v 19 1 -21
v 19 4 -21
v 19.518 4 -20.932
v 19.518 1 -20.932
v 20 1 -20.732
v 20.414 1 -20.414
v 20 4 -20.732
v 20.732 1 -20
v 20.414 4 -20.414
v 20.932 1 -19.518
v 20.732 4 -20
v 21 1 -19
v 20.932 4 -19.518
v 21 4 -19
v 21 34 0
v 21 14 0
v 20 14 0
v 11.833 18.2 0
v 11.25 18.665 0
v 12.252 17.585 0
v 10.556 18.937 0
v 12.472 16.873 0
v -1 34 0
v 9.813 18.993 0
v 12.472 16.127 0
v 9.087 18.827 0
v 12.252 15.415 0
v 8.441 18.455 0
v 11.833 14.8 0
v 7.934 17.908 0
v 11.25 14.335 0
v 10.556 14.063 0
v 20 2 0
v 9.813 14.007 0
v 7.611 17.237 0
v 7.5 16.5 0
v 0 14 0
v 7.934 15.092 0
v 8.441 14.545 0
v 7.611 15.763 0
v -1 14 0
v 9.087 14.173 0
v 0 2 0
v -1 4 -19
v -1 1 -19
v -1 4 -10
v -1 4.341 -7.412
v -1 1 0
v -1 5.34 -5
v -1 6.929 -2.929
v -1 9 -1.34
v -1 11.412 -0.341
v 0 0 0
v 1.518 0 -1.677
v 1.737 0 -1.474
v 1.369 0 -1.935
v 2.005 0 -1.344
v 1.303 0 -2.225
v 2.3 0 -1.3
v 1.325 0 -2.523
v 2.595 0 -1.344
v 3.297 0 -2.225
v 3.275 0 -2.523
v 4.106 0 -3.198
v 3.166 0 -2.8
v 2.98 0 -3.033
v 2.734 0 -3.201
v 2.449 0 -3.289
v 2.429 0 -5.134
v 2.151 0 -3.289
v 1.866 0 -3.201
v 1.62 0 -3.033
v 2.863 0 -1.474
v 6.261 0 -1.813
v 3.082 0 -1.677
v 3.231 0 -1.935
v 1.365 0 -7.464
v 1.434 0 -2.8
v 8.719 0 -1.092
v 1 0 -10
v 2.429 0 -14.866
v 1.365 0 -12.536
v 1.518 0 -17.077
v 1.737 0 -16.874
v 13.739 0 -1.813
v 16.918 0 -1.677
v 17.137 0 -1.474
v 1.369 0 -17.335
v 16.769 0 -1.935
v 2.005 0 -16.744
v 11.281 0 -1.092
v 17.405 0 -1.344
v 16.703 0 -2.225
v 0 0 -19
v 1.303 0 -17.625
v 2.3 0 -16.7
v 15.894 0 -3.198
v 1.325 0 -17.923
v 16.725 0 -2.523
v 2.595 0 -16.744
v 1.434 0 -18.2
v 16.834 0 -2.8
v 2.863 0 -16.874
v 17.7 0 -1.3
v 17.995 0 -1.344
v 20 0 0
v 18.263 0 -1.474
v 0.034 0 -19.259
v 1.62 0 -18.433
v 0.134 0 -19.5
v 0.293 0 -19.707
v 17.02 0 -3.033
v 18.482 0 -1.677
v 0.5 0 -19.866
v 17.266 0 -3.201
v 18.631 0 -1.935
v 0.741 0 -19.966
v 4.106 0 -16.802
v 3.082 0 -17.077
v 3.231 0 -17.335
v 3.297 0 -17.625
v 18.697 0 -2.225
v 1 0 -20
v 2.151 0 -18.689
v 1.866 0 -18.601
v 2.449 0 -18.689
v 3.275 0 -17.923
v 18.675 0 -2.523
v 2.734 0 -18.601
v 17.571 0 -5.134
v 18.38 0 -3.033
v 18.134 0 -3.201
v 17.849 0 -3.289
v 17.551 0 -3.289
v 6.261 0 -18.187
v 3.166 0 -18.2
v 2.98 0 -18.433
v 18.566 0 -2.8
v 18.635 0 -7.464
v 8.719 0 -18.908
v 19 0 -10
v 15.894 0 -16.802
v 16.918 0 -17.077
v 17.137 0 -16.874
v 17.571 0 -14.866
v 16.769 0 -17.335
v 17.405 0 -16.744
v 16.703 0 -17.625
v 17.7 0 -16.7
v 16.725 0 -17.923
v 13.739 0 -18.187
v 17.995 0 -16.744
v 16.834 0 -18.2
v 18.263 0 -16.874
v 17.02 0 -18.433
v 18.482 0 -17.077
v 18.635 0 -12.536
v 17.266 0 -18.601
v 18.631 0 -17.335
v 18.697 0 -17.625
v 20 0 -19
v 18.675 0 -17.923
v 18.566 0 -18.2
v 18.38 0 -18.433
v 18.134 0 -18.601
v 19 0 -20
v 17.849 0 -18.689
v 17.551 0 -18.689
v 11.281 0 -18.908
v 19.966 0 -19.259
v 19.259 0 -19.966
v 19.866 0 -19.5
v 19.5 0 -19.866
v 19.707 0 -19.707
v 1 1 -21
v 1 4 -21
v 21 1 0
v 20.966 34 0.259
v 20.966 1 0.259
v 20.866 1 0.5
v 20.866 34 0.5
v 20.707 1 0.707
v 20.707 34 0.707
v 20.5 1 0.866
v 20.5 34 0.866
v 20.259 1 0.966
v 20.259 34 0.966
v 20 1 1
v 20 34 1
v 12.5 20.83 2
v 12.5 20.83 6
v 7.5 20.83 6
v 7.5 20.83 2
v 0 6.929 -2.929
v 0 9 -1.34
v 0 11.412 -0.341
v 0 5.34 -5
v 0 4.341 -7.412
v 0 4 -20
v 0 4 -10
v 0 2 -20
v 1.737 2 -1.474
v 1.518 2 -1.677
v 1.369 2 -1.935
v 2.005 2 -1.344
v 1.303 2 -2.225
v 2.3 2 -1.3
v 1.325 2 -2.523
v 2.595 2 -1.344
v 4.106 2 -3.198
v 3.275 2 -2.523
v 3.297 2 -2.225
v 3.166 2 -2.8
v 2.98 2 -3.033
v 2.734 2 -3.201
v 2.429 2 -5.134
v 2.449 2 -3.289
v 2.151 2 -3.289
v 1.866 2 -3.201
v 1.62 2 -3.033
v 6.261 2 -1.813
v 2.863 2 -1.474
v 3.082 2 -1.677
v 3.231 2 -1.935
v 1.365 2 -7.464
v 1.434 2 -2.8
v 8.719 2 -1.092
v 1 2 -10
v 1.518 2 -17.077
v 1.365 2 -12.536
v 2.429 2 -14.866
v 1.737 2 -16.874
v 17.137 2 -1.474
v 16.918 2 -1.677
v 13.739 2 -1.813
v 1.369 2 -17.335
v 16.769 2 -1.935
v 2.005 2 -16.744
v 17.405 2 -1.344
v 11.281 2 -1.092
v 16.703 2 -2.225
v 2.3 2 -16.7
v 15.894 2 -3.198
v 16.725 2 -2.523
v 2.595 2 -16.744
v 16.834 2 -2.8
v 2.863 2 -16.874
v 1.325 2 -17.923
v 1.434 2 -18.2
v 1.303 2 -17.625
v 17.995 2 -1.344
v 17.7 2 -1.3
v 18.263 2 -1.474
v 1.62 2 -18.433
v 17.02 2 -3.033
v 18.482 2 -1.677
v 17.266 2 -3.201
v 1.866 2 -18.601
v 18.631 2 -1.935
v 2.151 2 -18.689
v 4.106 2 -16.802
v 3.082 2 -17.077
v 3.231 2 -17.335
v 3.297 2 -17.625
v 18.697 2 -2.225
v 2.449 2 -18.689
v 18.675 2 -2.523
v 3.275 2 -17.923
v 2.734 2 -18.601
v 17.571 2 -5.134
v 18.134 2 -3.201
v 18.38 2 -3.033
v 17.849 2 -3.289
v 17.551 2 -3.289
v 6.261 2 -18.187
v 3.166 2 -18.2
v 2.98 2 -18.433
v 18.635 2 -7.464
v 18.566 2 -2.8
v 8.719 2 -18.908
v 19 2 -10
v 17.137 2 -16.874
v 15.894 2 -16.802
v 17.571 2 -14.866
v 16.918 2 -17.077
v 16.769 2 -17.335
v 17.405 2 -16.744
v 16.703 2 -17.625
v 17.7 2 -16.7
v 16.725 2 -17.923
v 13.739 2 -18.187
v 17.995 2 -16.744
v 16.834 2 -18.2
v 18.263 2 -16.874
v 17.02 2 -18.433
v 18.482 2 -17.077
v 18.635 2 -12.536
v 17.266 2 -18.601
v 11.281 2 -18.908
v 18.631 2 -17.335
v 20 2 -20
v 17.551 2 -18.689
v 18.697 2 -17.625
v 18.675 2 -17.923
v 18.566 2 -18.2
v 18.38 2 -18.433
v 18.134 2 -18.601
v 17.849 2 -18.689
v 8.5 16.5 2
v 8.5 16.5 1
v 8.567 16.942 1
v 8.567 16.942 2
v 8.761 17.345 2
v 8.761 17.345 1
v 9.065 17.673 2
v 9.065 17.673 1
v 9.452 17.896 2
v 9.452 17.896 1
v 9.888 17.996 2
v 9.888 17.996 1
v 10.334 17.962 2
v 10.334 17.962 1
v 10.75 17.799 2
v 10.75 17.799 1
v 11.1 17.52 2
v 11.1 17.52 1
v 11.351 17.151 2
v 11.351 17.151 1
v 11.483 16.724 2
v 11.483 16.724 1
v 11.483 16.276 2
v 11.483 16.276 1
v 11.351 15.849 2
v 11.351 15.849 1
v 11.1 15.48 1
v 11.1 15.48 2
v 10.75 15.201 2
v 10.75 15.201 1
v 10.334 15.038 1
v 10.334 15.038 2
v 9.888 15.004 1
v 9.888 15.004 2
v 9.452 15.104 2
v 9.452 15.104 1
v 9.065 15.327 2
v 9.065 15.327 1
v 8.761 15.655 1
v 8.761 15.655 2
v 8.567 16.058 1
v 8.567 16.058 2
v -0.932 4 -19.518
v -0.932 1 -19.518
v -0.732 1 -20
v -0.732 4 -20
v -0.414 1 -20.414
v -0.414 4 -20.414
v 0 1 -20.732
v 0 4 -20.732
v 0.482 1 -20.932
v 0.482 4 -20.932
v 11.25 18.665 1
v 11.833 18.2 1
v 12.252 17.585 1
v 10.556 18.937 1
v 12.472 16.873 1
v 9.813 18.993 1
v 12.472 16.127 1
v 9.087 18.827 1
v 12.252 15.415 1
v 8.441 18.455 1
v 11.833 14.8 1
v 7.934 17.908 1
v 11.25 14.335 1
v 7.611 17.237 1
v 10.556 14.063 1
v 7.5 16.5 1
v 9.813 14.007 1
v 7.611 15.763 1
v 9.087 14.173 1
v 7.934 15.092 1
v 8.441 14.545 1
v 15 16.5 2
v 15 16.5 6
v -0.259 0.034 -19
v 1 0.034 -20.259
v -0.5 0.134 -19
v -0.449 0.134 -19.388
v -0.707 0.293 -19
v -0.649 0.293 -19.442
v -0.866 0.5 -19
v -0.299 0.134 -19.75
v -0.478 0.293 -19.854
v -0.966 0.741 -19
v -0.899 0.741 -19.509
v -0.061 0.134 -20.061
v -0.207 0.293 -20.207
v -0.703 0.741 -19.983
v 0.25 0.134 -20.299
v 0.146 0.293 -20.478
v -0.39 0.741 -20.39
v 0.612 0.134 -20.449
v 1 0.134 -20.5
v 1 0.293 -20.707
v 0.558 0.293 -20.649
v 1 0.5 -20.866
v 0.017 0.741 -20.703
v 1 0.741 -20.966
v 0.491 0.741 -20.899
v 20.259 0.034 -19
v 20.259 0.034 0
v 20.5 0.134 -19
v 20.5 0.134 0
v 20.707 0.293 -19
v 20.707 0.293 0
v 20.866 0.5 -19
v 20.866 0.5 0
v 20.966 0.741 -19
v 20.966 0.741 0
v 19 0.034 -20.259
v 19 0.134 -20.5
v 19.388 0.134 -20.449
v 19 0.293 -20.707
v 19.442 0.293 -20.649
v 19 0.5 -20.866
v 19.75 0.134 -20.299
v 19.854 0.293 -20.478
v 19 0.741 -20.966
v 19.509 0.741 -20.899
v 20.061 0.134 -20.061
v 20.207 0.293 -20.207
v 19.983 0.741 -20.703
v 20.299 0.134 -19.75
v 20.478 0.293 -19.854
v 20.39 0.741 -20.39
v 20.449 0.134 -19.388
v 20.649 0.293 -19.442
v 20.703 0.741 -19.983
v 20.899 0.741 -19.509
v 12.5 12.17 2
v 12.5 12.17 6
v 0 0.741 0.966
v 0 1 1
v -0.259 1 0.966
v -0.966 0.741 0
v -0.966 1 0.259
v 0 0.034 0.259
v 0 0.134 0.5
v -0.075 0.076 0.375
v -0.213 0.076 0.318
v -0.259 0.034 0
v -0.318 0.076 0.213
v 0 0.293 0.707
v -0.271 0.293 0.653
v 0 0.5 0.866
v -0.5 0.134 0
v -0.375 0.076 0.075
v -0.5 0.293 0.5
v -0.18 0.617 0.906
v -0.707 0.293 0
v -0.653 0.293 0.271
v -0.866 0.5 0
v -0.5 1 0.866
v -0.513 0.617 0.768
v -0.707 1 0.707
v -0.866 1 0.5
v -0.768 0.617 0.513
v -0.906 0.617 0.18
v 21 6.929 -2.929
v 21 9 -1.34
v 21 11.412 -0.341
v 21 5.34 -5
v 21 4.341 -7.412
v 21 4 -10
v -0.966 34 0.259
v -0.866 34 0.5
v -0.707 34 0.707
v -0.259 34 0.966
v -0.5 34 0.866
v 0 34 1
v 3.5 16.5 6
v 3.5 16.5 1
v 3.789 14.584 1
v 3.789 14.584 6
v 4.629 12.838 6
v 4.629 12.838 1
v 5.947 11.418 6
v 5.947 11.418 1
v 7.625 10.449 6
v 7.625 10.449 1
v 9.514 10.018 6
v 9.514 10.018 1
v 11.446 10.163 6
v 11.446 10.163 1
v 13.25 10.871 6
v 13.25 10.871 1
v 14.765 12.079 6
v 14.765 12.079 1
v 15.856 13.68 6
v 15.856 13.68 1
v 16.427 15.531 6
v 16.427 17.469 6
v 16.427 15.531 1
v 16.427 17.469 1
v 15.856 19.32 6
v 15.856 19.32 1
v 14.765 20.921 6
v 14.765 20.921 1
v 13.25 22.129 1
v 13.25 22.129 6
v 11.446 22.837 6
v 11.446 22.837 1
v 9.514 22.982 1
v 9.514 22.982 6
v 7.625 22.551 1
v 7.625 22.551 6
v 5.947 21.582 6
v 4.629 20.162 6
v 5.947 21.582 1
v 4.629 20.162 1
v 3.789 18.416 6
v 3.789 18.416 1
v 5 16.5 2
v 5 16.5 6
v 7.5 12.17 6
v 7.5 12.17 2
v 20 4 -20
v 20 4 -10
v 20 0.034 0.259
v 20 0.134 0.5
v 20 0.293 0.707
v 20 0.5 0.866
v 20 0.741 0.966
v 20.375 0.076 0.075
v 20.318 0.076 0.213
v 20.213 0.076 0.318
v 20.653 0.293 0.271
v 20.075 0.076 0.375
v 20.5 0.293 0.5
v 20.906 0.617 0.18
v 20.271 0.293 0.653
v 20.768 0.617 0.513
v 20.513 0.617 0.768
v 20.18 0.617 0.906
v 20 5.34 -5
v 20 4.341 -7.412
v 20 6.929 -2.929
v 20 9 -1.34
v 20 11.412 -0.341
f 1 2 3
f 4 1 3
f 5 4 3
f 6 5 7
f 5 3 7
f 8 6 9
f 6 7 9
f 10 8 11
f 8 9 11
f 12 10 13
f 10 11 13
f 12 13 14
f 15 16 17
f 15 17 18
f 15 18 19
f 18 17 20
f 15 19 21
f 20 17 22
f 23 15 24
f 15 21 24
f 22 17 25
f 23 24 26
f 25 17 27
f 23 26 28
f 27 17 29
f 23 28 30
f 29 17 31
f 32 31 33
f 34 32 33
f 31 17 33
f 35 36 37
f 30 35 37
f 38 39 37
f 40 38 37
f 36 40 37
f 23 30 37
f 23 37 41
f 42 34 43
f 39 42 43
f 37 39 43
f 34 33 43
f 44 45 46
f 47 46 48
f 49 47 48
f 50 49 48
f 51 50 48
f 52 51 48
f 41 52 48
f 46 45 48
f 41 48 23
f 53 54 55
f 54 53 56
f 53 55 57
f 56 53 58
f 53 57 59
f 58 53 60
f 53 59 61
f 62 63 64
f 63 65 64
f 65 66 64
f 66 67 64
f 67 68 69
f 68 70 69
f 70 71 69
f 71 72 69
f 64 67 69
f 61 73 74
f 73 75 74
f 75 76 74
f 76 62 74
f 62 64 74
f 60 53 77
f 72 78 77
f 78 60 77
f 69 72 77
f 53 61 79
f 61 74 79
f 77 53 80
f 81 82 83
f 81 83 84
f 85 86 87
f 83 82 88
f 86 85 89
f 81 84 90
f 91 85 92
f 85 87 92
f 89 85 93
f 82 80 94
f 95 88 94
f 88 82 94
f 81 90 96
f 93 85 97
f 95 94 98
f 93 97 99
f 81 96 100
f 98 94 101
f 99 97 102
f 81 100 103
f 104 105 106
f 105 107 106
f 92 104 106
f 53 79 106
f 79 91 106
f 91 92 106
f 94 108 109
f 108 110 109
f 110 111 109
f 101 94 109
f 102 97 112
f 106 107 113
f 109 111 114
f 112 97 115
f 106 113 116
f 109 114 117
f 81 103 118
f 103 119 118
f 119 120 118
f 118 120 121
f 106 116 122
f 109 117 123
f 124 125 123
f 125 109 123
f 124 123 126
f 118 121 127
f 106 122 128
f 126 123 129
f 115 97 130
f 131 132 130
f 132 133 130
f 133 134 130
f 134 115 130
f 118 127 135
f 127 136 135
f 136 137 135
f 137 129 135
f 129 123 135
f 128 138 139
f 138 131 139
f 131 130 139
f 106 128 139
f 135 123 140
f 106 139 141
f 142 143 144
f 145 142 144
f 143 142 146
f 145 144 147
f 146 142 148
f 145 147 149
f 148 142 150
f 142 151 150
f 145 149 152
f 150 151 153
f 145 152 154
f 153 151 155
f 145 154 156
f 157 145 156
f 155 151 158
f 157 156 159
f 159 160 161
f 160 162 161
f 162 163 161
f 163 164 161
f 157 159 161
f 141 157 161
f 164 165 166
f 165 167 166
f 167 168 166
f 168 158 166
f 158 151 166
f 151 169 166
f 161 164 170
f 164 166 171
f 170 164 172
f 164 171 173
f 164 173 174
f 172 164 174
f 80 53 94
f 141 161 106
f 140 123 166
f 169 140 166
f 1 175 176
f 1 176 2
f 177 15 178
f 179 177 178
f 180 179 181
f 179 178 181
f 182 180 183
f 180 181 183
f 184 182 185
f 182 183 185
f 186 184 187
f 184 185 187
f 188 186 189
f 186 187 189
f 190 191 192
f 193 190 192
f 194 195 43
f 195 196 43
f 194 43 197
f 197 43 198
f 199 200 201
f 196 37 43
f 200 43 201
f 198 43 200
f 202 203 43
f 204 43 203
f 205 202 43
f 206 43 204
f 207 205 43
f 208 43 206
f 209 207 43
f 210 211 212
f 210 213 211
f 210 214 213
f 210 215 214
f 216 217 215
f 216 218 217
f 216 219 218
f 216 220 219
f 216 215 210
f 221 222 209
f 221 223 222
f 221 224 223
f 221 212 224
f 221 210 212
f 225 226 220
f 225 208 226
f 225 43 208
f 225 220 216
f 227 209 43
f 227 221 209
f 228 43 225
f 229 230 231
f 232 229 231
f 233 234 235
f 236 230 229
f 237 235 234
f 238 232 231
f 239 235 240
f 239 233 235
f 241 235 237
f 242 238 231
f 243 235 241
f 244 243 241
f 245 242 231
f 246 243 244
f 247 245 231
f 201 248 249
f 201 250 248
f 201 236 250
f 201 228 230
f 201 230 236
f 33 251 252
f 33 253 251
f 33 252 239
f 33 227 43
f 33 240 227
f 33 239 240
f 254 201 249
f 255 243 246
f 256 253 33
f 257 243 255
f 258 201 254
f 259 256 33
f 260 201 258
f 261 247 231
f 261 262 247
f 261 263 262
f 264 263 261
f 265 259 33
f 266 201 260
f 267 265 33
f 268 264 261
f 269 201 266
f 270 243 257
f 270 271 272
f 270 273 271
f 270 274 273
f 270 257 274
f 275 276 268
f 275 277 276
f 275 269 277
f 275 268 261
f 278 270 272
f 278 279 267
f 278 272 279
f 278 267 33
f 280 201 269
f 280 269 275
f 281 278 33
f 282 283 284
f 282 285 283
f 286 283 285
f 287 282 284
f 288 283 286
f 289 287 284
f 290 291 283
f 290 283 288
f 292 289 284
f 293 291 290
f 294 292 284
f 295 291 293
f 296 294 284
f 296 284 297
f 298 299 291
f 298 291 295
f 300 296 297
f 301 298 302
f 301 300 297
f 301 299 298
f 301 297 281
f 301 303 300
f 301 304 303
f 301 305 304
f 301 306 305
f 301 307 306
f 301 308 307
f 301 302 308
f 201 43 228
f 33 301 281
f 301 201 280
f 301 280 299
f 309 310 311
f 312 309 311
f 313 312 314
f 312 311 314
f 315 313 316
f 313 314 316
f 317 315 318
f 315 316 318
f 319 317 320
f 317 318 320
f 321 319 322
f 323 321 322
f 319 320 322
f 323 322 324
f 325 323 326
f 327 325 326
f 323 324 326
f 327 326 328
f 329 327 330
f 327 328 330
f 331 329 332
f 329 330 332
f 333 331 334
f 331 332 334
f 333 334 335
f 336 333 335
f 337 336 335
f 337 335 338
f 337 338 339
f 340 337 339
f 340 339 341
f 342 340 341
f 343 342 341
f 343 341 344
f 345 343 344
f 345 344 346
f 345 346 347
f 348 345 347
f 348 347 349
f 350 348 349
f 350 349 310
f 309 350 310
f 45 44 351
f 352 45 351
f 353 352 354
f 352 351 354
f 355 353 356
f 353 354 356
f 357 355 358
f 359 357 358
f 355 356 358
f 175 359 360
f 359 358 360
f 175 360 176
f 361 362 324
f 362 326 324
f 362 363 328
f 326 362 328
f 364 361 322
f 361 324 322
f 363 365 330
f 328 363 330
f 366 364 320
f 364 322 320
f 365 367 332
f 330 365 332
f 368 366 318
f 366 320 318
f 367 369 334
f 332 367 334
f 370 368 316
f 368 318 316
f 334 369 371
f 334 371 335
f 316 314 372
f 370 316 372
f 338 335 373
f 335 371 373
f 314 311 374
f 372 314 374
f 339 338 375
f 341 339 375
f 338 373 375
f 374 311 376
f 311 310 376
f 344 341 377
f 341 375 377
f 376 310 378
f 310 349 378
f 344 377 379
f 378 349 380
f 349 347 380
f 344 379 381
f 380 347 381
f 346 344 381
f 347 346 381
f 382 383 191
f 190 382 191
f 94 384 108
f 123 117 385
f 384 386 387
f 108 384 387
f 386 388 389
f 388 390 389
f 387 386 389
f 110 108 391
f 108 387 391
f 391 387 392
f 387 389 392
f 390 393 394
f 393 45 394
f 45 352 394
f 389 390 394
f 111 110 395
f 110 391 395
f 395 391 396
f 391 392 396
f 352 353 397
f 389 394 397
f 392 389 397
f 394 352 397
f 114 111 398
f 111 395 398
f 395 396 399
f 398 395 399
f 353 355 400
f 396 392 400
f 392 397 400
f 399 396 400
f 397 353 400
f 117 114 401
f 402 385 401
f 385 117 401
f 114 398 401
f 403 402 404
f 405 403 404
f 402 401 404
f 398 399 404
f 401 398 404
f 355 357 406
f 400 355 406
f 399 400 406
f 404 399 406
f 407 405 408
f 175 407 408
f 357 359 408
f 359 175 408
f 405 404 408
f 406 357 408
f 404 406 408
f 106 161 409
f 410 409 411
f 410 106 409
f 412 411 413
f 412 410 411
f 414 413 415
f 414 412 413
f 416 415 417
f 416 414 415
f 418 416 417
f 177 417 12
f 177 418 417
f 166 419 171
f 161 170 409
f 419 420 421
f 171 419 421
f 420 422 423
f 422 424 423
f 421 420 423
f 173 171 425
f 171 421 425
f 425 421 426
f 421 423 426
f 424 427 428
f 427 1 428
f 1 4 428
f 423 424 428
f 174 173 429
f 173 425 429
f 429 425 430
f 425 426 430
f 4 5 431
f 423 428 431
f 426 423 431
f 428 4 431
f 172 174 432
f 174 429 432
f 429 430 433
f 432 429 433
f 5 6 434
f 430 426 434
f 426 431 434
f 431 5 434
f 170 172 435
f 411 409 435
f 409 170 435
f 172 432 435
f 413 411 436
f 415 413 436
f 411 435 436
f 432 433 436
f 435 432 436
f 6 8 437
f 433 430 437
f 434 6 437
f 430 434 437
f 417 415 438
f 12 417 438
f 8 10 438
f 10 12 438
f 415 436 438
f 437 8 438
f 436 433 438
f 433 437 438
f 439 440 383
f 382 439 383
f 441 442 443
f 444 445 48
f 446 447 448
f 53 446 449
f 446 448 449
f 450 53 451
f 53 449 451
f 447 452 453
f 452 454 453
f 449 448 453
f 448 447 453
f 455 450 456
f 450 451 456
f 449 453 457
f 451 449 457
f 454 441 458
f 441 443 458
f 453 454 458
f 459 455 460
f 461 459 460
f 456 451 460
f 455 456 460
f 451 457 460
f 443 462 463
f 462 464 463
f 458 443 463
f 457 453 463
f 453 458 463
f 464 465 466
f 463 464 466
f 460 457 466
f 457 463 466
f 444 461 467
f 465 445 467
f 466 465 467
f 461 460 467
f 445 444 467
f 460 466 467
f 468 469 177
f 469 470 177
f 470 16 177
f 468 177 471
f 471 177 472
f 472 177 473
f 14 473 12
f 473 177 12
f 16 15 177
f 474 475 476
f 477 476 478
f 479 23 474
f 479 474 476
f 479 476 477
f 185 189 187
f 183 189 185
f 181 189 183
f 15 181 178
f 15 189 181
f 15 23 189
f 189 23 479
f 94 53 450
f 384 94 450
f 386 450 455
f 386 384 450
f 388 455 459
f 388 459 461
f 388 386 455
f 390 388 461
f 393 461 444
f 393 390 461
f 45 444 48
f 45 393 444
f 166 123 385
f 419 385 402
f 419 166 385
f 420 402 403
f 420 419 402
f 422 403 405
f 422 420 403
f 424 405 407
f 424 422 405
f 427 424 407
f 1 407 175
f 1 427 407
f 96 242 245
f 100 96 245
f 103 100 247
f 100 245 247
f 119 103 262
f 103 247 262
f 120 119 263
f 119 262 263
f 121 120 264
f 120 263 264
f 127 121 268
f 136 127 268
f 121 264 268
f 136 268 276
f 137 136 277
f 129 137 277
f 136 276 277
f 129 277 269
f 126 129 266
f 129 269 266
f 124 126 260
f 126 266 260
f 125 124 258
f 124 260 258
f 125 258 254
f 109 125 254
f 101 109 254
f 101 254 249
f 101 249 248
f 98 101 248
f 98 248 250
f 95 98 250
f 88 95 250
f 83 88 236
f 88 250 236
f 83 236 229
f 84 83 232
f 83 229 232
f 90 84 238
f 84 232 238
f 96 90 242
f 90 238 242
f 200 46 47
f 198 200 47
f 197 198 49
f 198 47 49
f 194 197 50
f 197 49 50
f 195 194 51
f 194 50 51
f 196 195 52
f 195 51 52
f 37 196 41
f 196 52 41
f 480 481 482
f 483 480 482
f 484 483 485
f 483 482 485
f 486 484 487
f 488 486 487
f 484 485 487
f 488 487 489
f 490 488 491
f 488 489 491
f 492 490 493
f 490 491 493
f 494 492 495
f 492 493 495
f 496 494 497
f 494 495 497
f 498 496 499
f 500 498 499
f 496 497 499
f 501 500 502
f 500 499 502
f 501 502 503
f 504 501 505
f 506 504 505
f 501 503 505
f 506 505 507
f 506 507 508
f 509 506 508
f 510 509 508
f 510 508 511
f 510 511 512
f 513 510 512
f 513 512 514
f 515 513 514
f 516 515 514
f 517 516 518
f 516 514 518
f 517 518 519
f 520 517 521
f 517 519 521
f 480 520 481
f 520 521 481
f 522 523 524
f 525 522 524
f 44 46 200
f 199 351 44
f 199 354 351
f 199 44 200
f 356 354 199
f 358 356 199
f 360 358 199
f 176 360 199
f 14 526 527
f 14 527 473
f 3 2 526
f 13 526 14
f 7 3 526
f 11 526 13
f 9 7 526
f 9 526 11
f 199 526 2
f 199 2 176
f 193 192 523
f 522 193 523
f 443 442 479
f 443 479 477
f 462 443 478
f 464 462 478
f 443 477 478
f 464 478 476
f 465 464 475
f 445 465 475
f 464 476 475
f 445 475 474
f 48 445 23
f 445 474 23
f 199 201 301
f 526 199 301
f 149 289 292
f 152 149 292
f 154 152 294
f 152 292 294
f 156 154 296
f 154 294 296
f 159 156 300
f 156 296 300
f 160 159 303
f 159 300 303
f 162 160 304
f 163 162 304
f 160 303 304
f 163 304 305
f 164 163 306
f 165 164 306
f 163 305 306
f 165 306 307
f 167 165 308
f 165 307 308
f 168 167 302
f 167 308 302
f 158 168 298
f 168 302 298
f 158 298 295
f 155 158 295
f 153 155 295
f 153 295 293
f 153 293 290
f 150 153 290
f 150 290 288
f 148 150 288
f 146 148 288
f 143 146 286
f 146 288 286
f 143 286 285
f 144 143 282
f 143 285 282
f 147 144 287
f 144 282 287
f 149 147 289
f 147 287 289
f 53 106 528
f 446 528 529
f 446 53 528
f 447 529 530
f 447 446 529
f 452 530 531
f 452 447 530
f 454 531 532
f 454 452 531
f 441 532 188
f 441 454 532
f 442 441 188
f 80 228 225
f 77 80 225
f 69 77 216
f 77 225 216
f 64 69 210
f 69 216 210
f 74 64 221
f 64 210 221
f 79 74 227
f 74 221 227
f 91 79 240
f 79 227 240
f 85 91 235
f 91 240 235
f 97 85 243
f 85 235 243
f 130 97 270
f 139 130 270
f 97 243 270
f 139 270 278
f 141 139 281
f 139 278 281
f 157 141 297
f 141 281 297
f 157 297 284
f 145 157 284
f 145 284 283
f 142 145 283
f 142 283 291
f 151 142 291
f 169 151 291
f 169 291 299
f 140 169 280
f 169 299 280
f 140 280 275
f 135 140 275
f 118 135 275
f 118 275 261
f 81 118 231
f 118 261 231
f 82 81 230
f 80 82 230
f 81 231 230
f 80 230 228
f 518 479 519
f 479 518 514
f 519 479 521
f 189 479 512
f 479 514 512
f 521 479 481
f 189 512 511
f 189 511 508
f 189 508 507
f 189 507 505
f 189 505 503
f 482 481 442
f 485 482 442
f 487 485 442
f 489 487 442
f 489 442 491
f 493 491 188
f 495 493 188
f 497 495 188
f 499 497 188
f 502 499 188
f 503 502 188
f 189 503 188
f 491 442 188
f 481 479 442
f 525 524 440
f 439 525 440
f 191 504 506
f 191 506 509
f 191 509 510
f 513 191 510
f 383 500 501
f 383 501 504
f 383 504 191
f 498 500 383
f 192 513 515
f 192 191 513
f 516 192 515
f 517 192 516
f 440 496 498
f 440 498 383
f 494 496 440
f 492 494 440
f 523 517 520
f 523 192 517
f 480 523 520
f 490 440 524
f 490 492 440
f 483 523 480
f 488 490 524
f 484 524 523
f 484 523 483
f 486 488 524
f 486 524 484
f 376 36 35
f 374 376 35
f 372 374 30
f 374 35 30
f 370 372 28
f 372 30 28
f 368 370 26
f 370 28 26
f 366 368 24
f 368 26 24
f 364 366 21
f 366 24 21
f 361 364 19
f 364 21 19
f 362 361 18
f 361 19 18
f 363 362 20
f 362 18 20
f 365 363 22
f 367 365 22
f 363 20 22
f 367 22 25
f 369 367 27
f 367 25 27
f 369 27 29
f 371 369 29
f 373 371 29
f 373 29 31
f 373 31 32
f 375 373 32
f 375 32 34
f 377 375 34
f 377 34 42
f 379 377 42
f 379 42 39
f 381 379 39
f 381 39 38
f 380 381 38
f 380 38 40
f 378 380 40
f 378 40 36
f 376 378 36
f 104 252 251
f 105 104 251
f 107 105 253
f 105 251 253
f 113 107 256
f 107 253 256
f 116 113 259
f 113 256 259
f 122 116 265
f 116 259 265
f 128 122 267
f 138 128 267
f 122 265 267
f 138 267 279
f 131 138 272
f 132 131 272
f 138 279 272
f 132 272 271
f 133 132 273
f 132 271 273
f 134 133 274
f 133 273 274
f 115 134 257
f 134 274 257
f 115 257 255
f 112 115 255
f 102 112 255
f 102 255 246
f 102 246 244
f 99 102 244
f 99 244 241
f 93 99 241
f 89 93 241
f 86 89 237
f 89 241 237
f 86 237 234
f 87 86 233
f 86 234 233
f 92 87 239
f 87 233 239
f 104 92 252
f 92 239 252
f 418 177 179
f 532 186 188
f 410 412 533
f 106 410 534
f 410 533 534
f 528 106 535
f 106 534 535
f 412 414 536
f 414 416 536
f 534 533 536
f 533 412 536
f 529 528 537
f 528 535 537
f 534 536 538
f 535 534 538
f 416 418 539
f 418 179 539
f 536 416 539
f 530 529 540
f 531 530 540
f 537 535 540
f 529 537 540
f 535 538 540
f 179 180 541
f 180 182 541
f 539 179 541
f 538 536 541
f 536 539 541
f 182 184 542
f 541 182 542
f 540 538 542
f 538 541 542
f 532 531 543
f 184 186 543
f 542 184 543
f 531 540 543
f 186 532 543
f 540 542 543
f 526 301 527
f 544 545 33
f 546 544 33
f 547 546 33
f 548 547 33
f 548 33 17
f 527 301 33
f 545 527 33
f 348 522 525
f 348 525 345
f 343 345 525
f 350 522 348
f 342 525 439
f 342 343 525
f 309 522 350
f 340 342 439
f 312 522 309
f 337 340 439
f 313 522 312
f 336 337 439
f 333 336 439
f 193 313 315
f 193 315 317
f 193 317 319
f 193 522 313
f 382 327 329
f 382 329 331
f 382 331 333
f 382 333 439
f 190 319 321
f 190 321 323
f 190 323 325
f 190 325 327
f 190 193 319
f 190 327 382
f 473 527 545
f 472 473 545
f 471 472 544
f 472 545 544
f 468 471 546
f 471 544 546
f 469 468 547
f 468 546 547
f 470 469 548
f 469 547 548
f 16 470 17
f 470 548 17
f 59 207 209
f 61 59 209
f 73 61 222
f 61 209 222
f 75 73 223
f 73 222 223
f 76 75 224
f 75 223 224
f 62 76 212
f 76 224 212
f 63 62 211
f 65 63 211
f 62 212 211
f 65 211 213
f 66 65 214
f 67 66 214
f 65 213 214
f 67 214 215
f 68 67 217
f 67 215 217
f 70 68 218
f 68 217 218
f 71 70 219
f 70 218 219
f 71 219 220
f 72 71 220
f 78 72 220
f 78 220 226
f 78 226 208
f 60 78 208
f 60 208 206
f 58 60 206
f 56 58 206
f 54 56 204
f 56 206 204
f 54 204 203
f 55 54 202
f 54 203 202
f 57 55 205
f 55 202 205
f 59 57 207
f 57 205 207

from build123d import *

# Parameters (mm, degrees)
SKETCH_1_W          = 22
SKETCH_1_H          = 22
SKETCH_1_W_2        = 20
SKETCH_1_H_2        = 20
EXTRUDE_1_DEPTH     = 4
SKETCH_2_W          = 20
SKETCH_2_H          = 20
EXTRUDE_2_DEPTH     = 2
CUT_EXTRUDE_1_DEPTH = 2
SKETCH_4_R          = 1
CUT_EXTRUDE_2_DEPTH = 2
EXTRUDE_4_DEPTH     = 30
CUT_EXTRUDE_3_DEPTH = 46.617978912
SKETCH_8_R          = 2.5
CUT_EXTRUDE_4_DEPTH = 4
SKETCH_10_R         = 6.5
EXTRUDE_5_DEPTH     = 5
CUT_EXTRUDE_5_DEPTH = 4
SKETCH_12_R         = 1.5
CUT_EXTRUDE_6_DEPTH = 4
FILLET_2_R          = 2
FILLET_3_R          = 2
FILLET_4_R          = 1
FILLET_5_R          = 1
FILLET_6_R          = 1


with BuildPart() as part:
    # 草图1 → 凸台-拉伸1 (new body)
    with BuildSketch(Plane(origin=(0, 0, 0), x_dir=(1, 0, 0), z_dir=(0, 1, 0))):
        with Locations((10, 10)):
            Rectangle(SKETCH_1_W, SKETCH_1_H)
        with Locations((10, 10)):
            Rectangle(SKETCH_1_W_2, SKETCH_1_H_2, mode=Mode.SUBTRACT)
    extrude(amount=EXTRUDE_1_DEPTH)

    # 草图2 → 凸台-拉伸2 (add)
    with BuildSketch(Plane(origin=(0, 0, 0), x_dir=(1, 0, 0), z_dir=(0, 1, 0))):
        with Locations((10, 10)):
            Rectangle(SKETCH_2_W, SKETCH_2_H)
    extrude(amount=EXTRUDE_2_DEPTH)

    # 草图3 → 切除-拉伸1 (cut)
    with BuildSketch(Plane(origin=(0, 2, 0), x_dir=(1, 0, 0), z_dir=(0, 1, 0))):
        with BuildLine():
            ThreePointArc((19, 10), (10, 19), (1, 10))
            Line((1, 10), (19, 10))
        make_face()
        with BuildLine():
            Line((19, 10), (1, 10))
            ThreePointArc((1, 10), (10, 1), (19, 10))
        make_face()
    extrude(amount=-CUT_EXTRUDE_1_DEPTH, mode=Mode.SUBTRACT)

    # 草图4 → 切除-拉伸2 (cut)
    with BuildSketch(Plane(origin=(0, 2, 0), x_dir=(1, 0, 0), z_dir=(0, 1, 0))):
        with Locations(Location((2.3, 17.7, 0), (0, 0, 270))):
            Circle(SKETCH_4_R)
        with Locations(Location((17.7, 17.7, 0), (0, 0, 270))):
            Circle(SKETCH_4_R)
        with Locations(Location((17.7, 2.3, 0), (0, 0, 270))):
            Circle(SKETCH_4_R)
        with Locations(Location((2.3, 2.3, 0), (0, 0, 270))):
            Circle(SKETCH_4_R)
    extrude(amount=-CUT_EXTRUDE_2_DEPTH, mode=Mode.SUBTRACT)

    # 草图5 → 凸台-拉伸4 (add)
    with BuildSketch(Plane(origin=(0, 4, 0), x_dir=(1, 0, 0), z_dir=(0, 1, 0))):
        Polygon((0, 0), (0, 10), (-1, 10), (-1, -1), (21, -1), (21, 10), (20, 10), (20, 0), align=None)
    extrude(amount=EXTRUDE_4_DEPTH)

    # 草图7 → 切除-拉伸3 (cut, through all)
    with BuildSketch(Plane.ZY.offset(1)):
        with BuildLine():
            ThreePointArc((-10, 4), (-2.928932188, 6.928932188), (0, 14))
            Line((0, 14), (-10, 14))
            Line((-10, 14), (-10, 4))
        make_face()
        with BuildLine():
            Line((-10, 14), (0, 14))
            ThreePointArc((0, 14), (-2.928932188, 21.071067812), (-10, 24))
            Line((-10, 24), (-10, 14))
        make_face()
        with BuildLine():
            Line((0, 14), (0, 34))
            Line((0, 34), (-10, 34))
            Line((-10, 34), (-10, 24))
            ThreePointArc((-10, 24), (-2.928932188, 21.071067812), (0, 14))
        make_face()
    extrude(amount=-CUT_EXTRUDE_3_DEPTH, mode=Mode.SUBTRACT)

    # 草图8 → 切除-拉伸4 (cut)
    with BuildSketch(Plane(origin=(0, 0, 0), x_dir=(-1, 0, 0), z_dir=(0, 0, -1))):
        with Locations((-10, 16.5)):
            Circle(SKETCH_8_R)
    extrude(amount=-CUT_EXTRUDE_4_DEPTH, mode=Mode.SUBTRACT)

    # 草图10 → 凸台-拉伸5 (add)
    with BuildSketch(Plane.XY.offset(1)):
        with Locations(Location((10, 16.5, 0), (0, 0, 180))):
            Circle(SKETCH_10_R)
    extrude(amount=EXTRUDE_5_DEPTH)

    # 草图11 → 切除-拉伸5 (cut)
    with BuildSketch(Plane.XY.offset(6)):
        Polygon((15, 16.5), (12.5, 20.830127019), (7.5, 20.830127019), (5, 16.5), (7.5, 12.169872981), (12.5, 12.169872981), align=None)
    extrude(amount=-CUT_EXTRUDE_5_DEPTH, mode=Mode.SUBTRACT)

    # 草图12 → 切除-拉伸6 (cut)
    with BuildSketch(Plane(origin=(0, 0, 1), x_dir=(-1, 0, 0), z_dir=(0, 0, -1))):
        with Locations((-10, 16.5)):
            Circle(SKETCH_12_R)
    extrude(amount=-CUT_EXTRUDE_6_DEPTH, mode=Mode.SUBTRACT)

    # 圆角2
    fillet_2_edges = [part.edges().sort_by_distance(p)[0] for p in [
        (-1, 2, -21),
    ]]
    fillet(fillet_2_edges, radius=FILLET_2_R)

    # 圆角3
    fillet_3_edges = [part.edges().sort_by_distance(p)[0] for p in [
        (21, 2, -21),
    ]]
    fillet(fillet_3_edges, radius=FILLET_3_R)

    # 圆角4
    fillet_4_edges = [part.edges().sort_by_distance(p)[0] for p in [
        (21, 17, 1),
    ]]
    fillet(fillet_4_edges, radius=FILLET_4_R - 0.0001)  # a hair under: the kernel refuses the full size

    # 圆角5
    fillet_5_edges = [part.edges().sort_by_distance(p)[0] for p in [
        (-1, 17, 1),
    ]]
    fillet(fillet_5_edges, radius=FILLET_5_R - 0.0001)  # a hair under: the kernel refuses the full size

    # 圆角6
    fillet_6_edges = [part.edges().sort_by_distance(p)[0] for p in [
        (-1, 0, -9.49995),
        (-0.414213562, 0, -20.414213562),
        (10, 0, -21),
        (20.414213562, 0, -20.414213562),
        (21, 0, -9.49995),
        (20.707136071, 0, 0.707136071),
        (10, 0, 1),
        (-0.707136071, 0, 0.707136071),
    ]]
    fillet(fillet_6_edges, radius=FILLET_6_R - 0.0001)  # a hair under: the kernel refuses the full size


solid = part.part
